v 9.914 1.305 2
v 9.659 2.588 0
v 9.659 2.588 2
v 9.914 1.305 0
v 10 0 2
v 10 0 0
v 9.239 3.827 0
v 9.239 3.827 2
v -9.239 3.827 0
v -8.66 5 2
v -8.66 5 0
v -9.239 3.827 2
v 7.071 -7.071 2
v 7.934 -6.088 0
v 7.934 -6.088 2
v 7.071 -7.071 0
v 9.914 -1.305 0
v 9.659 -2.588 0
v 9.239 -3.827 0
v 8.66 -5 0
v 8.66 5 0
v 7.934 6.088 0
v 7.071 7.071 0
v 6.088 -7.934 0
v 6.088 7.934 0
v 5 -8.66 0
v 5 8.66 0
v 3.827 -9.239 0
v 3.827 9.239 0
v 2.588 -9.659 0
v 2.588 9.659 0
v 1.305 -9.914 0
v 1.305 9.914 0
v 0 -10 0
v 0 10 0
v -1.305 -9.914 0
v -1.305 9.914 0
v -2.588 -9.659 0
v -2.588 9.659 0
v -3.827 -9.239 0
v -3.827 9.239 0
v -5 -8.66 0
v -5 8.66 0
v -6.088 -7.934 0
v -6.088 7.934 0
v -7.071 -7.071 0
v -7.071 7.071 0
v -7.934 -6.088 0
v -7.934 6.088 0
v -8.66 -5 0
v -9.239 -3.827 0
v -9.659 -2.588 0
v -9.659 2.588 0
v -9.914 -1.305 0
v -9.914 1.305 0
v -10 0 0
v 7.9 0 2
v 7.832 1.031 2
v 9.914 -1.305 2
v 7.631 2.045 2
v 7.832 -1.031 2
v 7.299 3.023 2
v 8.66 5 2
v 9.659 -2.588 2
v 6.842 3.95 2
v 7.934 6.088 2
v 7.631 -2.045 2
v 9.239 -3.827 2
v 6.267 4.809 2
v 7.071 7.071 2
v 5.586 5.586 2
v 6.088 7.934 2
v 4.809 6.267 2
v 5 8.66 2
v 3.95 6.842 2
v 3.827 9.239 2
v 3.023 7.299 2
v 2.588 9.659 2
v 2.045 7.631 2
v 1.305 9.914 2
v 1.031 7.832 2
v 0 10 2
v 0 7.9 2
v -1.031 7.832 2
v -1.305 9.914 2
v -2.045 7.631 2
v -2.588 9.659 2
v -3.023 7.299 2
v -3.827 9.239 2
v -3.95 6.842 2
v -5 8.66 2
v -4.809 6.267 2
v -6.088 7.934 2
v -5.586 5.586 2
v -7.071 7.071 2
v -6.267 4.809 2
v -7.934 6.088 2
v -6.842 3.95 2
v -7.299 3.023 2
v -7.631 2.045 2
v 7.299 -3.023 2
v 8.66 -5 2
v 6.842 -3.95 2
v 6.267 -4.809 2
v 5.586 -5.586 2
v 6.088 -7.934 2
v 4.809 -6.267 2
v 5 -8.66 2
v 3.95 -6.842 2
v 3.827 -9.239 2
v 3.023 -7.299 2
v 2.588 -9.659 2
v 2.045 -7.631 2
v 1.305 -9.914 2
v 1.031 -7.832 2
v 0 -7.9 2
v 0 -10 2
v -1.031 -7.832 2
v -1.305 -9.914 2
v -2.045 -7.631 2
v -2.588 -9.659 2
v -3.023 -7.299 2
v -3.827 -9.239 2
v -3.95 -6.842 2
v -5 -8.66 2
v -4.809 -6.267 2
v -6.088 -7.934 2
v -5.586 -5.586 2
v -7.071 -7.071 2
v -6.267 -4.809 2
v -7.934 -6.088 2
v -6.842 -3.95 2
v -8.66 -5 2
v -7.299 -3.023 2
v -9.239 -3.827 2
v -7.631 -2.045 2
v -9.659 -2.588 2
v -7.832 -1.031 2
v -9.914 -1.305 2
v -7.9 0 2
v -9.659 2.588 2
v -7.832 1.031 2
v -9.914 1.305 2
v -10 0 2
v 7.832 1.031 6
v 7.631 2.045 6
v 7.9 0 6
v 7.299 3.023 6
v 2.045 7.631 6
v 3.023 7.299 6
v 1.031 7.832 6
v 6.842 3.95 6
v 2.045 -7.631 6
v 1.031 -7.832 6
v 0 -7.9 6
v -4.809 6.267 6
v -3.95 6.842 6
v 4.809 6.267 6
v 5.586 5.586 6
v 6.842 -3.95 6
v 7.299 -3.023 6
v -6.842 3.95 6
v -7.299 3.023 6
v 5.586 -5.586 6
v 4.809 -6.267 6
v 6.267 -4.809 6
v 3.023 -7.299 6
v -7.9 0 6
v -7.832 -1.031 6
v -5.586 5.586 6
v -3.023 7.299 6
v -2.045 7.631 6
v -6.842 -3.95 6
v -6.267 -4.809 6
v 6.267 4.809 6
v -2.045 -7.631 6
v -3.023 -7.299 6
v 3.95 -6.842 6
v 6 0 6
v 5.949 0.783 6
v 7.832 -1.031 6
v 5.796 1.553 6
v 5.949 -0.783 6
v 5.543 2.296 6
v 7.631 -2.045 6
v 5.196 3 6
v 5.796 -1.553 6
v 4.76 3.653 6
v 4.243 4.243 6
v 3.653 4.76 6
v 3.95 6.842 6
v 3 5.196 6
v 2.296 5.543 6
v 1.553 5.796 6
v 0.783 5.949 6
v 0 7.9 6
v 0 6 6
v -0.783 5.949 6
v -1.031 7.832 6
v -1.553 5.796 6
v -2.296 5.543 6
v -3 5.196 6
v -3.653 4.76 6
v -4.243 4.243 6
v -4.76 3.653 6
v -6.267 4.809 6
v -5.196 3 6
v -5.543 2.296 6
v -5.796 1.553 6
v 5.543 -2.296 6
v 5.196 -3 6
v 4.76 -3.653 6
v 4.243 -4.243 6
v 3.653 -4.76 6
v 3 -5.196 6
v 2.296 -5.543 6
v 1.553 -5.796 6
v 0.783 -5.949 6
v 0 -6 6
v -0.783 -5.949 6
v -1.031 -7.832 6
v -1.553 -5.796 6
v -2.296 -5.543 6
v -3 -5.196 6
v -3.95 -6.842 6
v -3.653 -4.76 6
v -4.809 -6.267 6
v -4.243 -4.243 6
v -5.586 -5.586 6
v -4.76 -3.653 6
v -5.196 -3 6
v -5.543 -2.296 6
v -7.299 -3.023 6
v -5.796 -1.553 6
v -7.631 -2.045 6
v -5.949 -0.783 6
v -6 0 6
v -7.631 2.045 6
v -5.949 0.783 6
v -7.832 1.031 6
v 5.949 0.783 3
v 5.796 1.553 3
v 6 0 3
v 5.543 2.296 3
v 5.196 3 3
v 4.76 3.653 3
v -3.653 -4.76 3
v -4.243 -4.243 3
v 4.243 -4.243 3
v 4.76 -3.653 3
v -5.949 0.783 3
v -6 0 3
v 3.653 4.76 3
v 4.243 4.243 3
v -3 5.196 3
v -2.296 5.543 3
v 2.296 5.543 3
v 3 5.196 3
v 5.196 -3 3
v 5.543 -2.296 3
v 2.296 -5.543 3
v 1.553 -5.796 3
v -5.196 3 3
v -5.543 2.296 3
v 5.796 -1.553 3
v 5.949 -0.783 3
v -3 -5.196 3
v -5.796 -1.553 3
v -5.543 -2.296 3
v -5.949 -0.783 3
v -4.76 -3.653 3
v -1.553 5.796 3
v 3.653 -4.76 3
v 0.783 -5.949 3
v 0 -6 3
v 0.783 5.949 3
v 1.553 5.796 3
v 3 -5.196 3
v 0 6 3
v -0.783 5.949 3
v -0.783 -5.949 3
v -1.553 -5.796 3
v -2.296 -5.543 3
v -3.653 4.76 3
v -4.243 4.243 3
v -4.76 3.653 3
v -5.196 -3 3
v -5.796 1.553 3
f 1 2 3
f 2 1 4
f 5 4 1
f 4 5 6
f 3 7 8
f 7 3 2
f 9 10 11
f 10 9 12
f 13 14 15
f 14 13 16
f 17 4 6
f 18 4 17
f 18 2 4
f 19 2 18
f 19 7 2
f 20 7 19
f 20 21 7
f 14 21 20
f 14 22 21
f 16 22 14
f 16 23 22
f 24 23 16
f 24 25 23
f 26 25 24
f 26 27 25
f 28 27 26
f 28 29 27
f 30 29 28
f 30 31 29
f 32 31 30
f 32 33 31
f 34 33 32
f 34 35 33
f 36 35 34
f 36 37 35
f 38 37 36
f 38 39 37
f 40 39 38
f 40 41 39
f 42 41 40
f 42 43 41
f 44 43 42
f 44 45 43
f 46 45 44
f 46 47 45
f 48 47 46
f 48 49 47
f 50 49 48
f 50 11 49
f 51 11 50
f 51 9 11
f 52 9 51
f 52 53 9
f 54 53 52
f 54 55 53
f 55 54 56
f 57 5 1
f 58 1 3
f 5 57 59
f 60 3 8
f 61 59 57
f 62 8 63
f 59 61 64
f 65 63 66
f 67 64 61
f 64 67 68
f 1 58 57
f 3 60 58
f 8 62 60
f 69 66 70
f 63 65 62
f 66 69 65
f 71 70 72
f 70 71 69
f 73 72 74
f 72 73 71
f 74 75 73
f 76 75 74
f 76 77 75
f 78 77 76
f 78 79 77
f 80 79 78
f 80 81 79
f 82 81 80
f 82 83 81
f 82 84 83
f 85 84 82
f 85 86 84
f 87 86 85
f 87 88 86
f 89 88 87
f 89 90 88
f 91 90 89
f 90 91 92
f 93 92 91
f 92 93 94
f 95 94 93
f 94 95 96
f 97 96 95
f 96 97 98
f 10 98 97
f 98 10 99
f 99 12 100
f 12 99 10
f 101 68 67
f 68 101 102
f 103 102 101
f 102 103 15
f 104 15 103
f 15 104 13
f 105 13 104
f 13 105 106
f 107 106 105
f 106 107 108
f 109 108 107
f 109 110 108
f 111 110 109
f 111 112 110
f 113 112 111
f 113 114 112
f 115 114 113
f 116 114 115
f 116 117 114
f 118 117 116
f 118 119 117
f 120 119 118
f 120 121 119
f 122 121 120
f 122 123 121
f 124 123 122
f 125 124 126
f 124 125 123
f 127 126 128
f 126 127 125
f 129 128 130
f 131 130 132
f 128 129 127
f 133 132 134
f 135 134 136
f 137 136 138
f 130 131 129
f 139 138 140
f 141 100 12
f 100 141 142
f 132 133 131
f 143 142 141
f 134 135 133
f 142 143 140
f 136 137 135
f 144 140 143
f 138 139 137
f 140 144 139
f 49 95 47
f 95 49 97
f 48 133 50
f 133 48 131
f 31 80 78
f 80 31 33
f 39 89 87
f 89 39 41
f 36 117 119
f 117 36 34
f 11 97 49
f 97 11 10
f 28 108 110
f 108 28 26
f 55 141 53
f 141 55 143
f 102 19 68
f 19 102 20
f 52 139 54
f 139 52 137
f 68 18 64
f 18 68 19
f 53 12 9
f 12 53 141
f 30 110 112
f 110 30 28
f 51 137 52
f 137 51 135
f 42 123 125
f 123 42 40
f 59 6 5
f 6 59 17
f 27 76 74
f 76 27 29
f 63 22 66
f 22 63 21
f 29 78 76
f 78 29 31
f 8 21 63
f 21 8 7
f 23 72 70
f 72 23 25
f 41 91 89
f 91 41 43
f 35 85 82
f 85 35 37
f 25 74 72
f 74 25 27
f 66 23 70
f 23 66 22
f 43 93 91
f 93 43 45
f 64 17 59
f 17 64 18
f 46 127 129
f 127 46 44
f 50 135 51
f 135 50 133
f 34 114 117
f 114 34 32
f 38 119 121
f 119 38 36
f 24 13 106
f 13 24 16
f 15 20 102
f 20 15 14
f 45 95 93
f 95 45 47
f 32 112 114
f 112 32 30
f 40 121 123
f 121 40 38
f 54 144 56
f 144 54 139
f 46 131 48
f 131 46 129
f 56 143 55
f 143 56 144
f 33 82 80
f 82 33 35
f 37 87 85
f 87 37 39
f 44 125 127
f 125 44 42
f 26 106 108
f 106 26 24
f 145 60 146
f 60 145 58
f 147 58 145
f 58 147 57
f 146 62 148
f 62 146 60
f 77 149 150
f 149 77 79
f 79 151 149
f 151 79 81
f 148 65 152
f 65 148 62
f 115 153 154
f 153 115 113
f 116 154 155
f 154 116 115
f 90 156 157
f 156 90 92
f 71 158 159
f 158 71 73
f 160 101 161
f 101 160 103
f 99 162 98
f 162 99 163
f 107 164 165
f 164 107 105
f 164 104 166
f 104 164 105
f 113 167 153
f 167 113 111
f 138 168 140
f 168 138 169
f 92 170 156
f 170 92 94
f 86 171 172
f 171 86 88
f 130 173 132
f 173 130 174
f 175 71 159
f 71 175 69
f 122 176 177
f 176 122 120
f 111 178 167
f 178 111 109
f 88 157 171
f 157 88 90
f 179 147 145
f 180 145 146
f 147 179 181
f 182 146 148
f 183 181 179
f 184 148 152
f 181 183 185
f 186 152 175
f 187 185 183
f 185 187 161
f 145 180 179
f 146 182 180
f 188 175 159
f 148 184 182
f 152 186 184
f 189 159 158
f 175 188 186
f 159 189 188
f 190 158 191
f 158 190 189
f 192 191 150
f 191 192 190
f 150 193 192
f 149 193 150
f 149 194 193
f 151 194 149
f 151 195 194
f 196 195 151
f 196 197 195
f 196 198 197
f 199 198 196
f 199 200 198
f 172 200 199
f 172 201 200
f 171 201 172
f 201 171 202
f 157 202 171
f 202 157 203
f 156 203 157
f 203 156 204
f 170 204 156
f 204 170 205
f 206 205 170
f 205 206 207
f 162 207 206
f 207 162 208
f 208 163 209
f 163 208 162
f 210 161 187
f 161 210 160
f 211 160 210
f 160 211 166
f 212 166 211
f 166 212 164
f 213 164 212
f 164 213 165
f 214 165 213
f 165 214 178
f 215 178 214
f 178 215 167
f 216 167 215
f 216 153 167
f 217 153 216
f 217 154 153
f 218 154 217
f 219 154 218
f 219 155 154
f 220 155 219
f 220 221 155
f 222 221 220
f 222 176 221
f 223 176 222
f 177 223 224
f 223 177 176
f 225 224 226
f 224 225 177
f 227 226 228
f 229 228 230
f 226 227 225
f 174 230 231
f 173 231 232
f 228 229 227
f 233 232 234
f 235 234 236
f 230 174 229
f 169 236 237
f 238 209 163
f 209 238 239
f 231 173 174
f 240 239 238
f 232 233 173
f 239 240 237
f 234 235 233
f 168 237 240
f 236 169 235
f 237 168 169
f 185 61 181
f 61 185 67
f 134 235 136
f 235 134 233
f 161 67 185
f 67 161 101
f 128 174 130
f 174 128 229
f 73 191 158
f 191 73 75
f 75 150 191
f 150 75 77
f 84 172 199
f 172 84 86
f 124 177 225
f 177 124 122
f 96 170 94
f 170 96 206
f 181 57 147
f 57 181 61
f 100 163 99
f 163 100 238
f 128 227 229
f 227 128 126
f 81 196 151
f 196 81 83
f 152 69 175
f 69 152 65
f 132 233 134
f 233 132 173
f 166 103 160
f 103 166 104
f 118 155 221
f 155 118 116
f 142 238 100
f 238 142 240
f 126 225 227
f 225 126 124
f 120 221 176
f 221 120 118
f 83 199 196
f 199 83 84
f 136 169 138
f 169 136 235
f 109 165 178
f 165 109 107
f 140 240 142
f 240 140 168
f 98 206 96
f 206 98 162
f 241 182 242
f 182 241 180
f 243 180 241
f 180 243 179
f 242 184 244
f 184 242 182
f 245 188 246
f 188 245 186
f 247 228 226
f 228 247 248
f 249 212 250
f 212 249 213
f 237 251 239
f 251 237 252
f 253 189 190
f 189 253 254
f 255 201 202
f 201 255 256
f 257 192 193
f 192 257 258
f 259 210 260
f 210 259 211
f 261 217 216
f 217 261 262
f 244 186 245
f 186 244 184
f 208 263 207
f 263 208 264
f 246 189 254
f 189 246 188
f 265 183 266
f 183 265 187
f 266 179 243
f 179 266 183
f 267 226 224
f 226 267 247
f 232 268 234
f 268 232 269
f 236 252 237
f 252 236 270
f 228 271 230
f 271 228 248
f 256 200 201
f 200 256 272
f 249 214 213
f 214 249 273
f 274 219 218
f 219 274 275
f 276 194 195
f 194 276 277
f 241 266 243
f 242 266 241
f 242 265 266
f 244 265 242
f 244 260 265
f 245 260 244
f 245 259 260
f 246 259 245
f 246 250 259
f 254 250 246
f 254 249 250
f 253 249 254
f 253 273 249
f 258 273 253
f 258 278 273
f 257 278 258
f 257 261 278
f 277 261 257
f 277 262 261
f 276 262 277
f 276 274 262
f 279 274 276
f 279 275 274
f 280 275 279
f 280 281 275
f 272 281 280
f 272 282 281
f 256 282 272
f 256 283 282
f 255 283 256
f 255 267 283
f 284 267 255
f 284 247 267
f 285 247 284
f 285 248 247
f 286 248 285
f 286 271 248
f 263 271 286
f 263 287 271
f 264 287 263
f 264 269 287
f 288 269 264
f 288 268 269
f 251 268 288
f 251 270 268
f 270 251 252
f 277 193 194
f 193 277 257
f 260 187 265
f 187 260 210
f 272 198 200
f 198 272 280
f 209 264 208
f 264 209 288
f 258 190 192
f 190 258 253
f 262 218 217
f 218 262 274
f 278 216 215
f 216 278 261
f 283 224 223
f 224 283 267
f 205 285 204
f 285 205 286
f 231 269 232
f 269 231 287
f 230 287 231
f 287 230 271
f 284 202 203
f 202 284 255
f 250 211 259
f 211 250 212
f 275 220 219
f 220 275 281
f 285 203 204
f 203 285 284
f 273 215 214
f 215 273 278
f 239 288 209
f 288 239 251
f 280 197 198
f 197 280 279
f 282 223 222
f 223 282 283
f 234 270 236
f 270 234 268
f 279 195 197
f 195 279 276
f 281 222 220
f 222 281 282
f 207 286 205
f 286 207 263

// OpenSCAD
// Difusor d'ull per a NeoPixel (encaixa al forat de 16 mm del frontal).
difference() {
    union() {
        cylinder(h = 2, d = 20, $fn = 48);       // vora exterior
        translate([0, 0, 2]) cylinder(h = 4, d = 15.8, $fn = 48); // cos que encaixa
    }
    translate([0, 0, 3]) cylinder(h = 4, d = 12, $fn = 48);       // cavitat del LED
}
